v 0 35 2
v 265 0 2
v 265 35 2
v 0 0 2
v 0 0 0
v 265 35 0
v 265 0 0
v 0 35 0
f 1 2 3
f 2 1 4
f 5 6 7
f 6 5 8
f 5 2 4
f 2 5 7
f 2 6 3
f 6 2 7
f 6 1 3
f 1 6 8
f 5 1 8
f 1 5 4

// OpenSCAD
// Generated by SolidPython 1.1.3 on 2023-05-28 11:24:09


cube(size = [265, 35, 2]);
/***********************************************
*********      SolidPython code:      **********
************************************************
 
import pathlib
import subprocess
import sys

from solid import OpenSCADObject, scad_render_to_file

app_binary = '/Applications/OpenSCAD.app/Contents/MacOS/OpenSCAD'


def save_openscad(o: OpenSCADObject):
    file_path = sys.argv[0].replace('.py', '.scad')
    scad_render_to_file(o, file_path)
    return file_path


def file_name_or_object_to_file_name(file_name_or_object: OpenSCADObject | str | pathlib.Path):
    if isinstance(file_name_or_object, OpenSCADObject):
        return save_openscad(file_name_or_object)
    elif isinstance(file_name_or_object, pathlib.Path):
        return file_name_or_object.as_posix()
    else:
        return file_name_or_object


def open_openscad(file_name_or_object: OpenSCADObject | str | pathlib.Path):
    file_name = file_name_or_object_to_file_name(file_name_or_object)
    process = subprocess.Popen([app_binary, file_name])
    process.wait()


def convert_to_stl(file_name_or_object: OpenSCADObject| str | pathlib.Path, *, preview: bool = False):
    file_name = file_name_or_object_to_file_name(file_name_or_object)

    stl_file_name = file_name.replace('.scad', '.stl')
    command = [
        app_binary, '--hardwarnings', '-o', stl_file_name,
        file_name]
    print(' '.join(command))
    process = subprocess.Popen(command)
    process.wait()
    if preview:
        subprocess.Popen(['open', '-a', 'Preview', stl_file_name])
 
 
************************************************/
